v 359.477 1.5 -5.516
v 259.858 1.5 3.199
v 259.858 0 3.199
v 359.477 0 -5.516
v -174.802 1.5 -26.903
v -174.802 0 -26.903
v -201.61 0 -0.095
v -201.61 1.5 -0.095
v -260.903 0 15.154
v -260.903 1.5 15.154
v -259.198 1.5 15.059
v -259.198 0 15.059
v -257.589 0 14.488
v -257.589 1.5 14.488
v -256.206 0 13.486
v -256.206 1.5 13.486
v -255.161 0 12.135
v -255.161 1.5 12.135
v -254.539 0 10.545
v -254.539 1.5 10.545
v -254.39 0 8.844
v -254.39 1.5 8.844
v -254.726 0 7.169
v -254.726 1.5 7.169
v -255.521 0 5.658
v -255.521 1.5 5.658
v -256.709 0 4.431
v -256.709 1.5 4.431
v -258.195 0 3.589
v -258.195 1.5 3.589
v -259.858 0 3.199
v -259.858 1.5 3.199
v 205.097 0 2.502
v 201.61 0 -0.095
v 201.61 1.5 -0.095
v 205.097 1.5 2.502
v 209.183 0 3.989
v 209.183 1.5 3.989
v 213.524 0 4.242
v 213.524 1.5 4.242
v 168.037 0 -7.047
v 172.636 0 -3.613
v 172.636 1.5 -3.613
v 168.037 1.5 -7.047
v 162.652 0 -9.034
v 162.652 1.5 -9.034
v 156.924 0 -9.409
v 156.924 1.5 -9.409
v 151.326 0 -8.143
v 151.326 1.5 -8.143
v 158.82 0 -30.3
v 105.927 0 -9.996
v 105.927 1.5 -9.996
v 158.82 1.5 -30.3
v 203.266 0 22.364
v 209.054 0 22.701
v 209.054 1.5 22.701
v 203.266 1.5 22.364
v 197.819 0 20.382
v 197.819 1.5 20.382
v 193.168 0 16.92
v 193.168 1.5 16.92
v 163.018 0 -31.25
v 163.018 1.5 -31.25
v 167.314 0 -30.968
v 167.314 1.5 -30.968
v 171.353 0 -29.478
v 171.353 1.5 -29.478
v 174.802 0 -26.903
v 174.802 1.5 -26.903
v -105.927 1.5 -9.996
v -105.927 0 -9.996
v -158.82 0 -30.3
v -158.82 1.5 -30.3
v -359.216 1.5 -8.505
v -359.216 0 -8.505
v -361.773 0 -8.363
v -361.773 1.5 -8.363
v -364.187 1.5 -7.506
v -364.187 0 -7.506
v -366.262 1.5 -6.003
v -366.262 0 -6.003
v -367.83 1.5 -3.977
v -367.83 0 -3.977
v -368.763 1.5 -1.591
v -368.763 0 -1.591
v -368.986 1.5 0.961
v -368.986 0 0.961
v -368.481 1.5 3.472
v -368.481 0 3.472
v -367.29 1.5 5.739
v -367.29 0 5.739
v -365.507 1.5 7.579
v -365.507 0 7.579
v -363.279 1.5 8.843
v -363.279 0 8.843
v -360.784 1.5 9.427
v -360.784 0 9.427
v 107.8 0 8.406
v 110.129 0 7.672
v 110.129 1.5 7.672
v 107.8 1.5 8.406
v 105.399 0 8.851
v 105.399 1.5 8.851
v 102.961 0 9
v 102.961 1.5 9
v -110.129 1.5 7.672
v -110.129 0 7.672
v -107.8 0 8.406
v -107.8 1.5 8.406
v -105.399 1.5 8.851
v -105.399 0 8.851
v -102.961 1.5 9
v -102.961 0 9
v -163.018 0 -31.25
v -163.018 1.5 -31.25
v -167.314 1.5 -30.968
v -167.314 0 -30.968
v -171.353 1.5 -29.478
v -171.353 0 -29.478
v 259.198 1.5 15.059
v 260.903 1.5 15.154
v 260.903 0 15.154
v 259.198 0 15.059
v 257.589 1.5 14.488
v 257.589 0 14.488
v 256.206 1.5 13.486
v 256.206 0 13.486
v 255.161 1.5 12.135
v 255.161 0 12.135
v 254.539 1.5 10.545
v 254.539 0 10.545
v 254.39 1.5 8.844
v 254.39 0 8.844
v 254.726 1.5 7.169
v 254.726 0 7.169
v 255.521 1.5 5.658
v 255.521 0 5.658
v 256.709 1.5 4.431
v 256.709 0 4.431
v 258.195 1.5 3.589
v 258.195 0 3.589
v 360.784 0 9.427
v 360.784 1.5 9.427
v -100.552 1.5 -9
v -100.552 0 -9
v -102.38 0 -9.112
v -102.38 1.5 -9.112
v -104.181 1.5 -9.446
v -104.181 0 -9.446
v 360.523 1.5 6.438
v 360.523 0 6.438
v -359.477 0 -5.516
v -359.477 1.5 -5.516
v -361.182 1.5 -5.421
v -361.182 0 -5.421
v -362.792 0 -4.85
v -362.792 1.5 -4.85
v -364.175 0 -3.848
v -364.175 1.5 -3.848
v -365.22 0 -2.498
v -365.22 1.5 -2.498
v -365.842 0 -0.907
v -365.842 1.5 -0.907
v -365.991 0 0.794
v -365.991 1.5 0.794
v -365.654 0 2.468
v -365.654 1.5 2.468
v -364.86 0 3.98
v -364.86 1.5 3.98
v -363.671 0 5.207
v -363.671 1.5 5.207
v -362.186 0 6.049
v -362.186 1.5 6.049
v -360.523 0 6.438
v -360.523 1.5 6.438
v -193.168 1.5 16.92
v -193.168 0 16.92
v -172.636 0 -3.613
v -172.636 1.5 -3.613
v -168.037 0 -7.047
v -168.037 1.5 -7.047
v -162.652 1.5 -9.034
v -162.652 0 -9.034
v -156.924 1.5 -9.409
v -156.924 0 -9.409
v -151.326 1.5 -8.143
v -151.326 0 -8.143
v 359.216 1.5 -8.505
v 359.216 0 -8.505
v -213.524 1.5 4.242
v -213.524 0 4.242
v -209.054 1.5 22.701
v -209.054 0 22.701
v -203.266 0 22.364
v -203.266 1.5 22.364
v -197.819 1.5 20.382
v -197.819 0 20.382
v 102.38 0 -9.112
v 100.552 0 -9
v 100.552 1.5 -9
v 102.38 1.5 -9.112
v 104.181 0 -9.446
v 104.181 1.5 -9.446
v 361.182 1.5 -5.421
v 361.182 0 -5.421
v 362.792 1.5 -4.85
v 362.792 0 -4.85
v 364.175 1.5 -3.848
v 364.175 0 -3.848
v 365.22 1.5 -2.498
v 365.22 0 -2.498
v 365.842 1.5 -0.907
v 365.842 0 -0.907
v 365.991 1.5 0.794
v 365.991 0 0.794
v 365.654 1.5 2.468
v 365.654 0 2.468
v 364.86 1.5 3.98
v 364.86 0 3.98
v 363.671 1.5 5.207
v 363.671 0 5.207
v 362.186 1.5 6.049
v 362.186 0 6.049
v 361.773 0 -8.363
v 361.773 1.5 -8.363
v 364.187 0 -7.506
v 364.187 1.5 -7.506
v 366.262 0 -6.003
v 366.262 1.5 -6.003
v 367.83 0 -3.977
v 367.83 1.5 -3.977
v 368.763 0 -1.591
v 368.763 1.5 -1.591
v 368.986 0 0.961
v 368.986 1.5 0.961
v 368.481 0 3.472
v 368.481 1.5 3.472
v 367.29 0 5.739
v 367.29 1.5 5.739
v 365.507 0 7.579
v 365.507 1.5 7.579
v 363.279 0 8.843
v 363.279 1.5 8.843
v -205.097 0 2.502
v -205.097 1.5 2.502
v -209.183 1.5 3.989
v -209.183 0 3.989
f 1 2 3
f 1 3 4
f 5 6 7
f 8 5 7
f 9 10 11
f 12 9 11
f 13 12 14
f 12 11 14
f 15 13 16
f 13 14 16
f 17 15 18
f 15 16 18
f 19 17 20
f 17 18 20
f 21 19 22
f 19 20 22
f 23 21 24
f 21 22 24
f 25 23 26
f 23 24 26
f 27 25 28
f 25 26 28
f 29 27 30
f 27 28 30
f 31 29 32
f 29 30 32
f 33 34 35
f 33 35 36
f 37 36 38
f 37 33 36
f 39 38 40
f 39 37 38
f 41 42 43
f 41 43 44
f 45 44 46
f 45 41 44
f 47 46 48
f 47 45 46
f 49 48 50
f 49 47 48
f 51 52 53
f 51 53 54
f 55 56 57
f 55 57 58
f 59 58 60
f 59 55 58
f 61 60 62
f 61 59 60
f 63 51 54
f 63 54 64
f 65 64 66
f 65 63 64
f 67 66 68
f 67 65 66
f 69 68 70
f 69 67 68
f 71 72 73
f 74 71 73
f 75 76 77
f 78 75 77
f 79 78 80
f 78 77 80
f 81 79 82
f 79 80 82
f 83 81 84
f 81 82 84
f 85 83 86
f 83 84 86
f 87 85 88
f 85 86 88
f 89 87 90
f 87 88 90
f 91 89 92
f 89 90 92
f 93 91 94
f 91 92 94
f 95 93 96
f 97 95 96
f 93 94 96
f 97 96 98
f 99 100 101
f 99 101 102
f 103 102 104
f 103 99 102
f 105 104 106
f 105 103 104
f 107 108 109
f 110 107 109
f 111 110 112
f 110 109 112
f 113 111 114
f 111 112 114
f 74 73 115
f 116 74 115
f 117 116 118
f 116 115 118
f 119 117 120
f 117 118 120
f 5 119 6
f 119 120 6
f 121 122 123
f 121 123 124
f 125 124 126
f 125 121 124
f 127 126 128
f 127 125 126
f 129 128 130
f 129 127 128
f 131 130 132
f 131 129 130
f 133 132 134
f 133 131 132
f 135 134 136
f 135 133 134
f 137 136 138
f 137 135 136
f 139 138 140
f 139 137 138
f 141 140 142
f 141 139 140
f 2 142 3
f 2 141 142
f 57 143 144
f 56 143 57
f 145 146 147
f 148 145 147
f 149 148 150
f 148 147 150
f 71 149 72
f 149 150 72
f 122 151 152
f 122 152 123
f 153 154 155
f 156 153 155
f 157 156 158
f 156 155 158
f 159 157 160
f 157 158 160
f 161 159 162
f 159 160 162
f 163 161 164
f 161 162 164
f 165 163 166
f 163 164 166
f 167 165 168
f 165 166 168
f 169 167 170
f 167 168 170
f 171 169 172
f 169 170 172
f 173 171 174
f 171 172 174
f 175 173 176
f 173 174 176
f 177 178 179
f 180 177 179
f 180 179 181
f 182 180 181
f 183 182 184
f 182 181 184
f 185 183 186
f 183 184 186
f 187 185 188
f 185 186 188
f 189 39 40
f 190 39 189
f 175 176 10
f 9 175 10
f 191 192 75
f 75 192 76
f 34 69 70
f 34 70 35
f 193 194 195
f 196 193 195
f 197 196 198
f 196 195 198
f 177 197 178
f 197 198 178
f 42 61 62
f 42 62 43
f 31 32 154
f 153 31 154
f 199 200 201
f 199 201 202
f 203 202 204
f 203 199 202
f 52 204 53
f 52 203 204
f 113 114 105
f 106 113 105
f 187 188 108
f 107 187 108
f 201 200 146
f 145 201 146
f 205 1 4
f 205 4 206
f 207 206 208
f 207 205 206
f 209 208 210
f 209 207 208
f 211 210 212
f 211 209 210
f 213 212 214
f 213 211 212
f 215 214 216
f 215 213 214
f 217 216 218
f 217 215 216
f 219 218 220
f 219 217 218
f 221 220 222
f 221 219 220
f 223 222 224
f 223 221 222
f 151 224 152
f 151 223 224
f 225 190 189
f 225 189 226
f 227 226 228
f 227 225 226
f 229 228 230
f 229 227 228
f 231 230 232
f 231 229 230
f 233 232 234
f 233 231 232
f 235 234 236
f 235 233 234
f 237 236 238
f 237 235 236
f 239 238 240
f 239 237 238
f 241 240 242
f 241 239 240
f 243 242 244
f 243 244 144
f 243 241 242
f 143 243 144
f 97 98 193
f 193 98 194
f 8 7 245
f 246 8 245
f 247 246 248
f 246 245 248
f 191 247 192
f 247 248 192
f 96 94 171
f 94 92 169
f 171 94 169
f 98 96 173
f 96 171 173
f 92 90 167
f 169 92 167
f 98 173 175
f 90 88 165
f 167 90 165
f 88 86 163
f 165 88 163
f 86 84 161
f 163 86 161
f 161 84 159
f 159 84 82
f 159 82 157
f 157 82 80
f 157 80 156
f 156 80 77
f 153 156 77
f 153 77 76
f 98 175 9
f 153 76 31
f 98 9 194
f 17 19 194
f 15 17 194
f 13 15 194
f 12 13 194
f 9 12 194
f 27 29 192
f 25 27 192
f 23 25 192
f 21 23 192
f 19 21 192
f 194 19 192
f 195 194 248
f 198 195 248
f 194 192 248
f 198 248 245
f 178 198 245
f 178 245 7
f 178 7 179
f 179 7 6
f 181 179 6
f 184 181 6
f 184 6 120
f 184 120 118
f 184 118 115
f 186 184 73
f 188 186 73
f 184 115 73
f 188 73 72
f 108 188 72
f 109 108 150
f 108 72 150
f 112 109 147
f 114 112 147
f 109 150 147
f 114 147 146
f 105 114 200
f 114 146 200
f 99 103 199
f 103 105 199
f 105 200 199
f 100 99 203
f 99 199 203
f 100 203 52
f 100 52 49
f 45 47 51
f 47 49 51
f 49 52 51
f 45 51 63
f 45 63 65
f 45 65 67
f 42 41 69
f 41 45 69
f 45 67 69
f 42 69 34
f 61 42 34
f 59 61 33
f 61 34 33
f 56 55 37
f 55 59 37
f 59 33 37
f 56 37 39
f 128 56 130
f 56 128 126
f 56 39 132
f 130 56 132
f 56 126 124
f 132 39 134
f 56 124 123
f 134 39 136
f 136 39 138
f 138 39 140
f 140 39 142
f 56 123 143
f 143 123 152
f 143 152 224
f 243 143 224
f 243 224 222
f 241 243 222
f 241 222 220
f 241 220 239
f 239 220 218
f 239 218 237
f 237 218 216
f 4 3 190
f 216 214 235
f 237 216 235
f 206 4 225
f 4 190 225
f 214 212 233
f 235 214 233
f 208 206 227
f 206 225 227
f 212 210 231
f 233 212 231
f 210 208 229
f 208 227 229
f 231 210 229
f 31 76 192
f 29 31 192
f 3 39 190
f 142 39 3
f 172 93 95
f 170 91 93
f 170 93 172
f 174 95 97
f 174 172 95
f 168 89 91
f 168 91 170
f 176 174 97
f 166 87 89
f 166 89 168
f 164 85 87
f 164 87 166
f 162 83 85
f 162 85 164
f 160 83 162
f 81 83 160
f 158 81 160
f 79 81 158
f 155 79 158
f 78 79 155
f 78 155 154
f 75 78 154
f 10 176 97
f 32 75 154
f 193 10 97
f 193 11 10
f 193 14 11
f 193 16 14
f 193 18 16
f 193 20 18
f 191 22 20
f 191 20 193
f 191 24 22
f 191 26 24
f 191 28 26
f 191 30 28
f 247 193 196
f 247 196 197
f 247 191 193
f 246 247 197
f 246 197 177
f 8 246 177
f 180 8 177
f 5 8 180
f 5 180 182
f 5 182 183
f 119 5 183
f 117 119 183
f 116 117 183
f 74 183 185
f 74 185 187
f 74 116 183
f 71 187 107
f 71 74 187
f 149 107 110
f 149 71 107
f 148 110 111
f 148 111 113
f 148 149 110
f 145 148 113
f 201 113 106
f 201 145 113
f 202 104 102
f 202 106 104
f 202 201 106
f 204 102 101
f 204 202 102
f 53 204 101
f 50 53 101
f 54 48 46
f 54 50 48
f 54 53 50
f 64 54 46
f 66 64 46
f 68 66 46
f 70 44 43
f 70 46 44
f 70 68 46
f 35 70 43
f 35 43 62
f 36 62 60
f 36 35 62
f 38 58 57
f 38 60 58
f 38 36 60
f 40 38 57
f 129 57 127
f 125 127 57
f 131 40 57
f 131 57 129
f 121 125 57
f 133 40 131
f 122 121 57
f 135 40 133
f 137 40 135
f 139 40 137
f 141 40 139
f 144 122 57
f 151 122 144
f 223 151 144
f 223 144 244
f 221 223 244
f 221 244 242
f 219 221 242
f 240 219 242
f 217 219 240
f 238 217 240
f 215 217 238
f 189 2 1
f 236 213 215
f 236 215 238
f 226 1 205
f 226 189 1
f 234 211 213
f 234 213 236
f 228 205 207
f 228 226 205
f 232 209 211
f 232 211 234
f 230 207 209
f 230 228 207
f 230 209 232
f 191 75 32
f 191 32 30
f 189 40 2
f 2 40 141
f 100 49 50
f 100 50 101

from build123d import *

# Parameters (mm, degrees)
BOSS_EXTRUDE1_DEPTH = 1.5
CUT_EXTRUDE1_DEPTH  = 371.327819887


with BuildPart() as part:
    # Sketch1 → Boss-Extrude1 (new body)
    with BuildSketch(Plane(origin=(0, 0, 0), x_dir=(1, 0, 0), z_dir=(0, 1, 0))):
        with BuildLine():
            Line((105.927382165, 9.996293603), (158.819770869, 30.299779353))
            ThreePointArc((158.819770869, 30.299779353), (167.313965475, 30.968286967), (174.80189183, 26.902674674))
            Line((174.80189183, 26.902674674), (201.609844783, 0.094721721))
            ThreePointArc((201.609844783, 0.094721721), (207.086144351, -3.394065873), (213.523782642, -4.241597033))
            Line((213.523782642, -4.241597033), (359.215598315, 8.504785207))
            ThreePointArc((359.215598315, 8.504785207), (368.965752283, 0.323434609), (360.784401685, -9.426719358))
            Line((360.784401685, -9.426719358), (209.053654194, -22.701439672))
            ThreePointArc((209.053654194, -22.701439672), (200.470136473, -21.571398126), (193.168403715, -16.919681334))
            Line((193.168403715, -16.919681334), (172.635581566, 3.613140816))
            ThreePointArc((172.635581566, 3.613140816), (162.651679758, 9.033957206), (151.326086951, 8.142613722))
            Line((151.326086951, 8.142613722), (110.128629497, -7.67160853))
            ThreePointArc((110.128629497, -7.67160853), (106.605981016, -8.665098151), (102.961270506, -9))
            Line((102.961270506, -9), (0, -9))
            Line((0, -9), (0, 9))
            Line((0, 9), (100.551862922, 9))
            ThreePointArc((100.551862922, 9), (103.285395804, 9.251176387), (105.927382165, 9.996293603))
        make_face()
    extrude(amount=BOSS_EXTRUDE1_DEPTH)

    # Sketch2 → Cut-Extrude1 (cut, through all)
    with BuildSketch(Plane(origin=(0, 1.5, 0), x_dir=(1, 0, 0), z_dir=(0, 1, 0))):
        with BuildLine():
            Line((259.857595734, -3.199373162), (359.477065544, 5.516201113))
            ThreePointArc((359.477065544, 5.516201113), (365.977168189, 0.061967381), (360.522934456, -6.438135264))
            Line((360.522934456, -6.438135264), (260.903464647, -15.153709539))
            ThreePointArc((260.903464647, -15.153709539), (254.403362002, -9.699475807), (259.857595734, -3.199373162))
        make_face()
    extrude(amount=-CUT_EXTRUDE1_DEPTH, mode=Mode.SUBTRACT)

    # Mirror2: part across plane


with BuildPart() as part_1:
    add(part.part)
    add(part.part.mirror(Plane(origin=(0, 0, 0), x_dir=(0, 0, 1), z_dir=(1, 0, 0))))


solid = part_1.part
